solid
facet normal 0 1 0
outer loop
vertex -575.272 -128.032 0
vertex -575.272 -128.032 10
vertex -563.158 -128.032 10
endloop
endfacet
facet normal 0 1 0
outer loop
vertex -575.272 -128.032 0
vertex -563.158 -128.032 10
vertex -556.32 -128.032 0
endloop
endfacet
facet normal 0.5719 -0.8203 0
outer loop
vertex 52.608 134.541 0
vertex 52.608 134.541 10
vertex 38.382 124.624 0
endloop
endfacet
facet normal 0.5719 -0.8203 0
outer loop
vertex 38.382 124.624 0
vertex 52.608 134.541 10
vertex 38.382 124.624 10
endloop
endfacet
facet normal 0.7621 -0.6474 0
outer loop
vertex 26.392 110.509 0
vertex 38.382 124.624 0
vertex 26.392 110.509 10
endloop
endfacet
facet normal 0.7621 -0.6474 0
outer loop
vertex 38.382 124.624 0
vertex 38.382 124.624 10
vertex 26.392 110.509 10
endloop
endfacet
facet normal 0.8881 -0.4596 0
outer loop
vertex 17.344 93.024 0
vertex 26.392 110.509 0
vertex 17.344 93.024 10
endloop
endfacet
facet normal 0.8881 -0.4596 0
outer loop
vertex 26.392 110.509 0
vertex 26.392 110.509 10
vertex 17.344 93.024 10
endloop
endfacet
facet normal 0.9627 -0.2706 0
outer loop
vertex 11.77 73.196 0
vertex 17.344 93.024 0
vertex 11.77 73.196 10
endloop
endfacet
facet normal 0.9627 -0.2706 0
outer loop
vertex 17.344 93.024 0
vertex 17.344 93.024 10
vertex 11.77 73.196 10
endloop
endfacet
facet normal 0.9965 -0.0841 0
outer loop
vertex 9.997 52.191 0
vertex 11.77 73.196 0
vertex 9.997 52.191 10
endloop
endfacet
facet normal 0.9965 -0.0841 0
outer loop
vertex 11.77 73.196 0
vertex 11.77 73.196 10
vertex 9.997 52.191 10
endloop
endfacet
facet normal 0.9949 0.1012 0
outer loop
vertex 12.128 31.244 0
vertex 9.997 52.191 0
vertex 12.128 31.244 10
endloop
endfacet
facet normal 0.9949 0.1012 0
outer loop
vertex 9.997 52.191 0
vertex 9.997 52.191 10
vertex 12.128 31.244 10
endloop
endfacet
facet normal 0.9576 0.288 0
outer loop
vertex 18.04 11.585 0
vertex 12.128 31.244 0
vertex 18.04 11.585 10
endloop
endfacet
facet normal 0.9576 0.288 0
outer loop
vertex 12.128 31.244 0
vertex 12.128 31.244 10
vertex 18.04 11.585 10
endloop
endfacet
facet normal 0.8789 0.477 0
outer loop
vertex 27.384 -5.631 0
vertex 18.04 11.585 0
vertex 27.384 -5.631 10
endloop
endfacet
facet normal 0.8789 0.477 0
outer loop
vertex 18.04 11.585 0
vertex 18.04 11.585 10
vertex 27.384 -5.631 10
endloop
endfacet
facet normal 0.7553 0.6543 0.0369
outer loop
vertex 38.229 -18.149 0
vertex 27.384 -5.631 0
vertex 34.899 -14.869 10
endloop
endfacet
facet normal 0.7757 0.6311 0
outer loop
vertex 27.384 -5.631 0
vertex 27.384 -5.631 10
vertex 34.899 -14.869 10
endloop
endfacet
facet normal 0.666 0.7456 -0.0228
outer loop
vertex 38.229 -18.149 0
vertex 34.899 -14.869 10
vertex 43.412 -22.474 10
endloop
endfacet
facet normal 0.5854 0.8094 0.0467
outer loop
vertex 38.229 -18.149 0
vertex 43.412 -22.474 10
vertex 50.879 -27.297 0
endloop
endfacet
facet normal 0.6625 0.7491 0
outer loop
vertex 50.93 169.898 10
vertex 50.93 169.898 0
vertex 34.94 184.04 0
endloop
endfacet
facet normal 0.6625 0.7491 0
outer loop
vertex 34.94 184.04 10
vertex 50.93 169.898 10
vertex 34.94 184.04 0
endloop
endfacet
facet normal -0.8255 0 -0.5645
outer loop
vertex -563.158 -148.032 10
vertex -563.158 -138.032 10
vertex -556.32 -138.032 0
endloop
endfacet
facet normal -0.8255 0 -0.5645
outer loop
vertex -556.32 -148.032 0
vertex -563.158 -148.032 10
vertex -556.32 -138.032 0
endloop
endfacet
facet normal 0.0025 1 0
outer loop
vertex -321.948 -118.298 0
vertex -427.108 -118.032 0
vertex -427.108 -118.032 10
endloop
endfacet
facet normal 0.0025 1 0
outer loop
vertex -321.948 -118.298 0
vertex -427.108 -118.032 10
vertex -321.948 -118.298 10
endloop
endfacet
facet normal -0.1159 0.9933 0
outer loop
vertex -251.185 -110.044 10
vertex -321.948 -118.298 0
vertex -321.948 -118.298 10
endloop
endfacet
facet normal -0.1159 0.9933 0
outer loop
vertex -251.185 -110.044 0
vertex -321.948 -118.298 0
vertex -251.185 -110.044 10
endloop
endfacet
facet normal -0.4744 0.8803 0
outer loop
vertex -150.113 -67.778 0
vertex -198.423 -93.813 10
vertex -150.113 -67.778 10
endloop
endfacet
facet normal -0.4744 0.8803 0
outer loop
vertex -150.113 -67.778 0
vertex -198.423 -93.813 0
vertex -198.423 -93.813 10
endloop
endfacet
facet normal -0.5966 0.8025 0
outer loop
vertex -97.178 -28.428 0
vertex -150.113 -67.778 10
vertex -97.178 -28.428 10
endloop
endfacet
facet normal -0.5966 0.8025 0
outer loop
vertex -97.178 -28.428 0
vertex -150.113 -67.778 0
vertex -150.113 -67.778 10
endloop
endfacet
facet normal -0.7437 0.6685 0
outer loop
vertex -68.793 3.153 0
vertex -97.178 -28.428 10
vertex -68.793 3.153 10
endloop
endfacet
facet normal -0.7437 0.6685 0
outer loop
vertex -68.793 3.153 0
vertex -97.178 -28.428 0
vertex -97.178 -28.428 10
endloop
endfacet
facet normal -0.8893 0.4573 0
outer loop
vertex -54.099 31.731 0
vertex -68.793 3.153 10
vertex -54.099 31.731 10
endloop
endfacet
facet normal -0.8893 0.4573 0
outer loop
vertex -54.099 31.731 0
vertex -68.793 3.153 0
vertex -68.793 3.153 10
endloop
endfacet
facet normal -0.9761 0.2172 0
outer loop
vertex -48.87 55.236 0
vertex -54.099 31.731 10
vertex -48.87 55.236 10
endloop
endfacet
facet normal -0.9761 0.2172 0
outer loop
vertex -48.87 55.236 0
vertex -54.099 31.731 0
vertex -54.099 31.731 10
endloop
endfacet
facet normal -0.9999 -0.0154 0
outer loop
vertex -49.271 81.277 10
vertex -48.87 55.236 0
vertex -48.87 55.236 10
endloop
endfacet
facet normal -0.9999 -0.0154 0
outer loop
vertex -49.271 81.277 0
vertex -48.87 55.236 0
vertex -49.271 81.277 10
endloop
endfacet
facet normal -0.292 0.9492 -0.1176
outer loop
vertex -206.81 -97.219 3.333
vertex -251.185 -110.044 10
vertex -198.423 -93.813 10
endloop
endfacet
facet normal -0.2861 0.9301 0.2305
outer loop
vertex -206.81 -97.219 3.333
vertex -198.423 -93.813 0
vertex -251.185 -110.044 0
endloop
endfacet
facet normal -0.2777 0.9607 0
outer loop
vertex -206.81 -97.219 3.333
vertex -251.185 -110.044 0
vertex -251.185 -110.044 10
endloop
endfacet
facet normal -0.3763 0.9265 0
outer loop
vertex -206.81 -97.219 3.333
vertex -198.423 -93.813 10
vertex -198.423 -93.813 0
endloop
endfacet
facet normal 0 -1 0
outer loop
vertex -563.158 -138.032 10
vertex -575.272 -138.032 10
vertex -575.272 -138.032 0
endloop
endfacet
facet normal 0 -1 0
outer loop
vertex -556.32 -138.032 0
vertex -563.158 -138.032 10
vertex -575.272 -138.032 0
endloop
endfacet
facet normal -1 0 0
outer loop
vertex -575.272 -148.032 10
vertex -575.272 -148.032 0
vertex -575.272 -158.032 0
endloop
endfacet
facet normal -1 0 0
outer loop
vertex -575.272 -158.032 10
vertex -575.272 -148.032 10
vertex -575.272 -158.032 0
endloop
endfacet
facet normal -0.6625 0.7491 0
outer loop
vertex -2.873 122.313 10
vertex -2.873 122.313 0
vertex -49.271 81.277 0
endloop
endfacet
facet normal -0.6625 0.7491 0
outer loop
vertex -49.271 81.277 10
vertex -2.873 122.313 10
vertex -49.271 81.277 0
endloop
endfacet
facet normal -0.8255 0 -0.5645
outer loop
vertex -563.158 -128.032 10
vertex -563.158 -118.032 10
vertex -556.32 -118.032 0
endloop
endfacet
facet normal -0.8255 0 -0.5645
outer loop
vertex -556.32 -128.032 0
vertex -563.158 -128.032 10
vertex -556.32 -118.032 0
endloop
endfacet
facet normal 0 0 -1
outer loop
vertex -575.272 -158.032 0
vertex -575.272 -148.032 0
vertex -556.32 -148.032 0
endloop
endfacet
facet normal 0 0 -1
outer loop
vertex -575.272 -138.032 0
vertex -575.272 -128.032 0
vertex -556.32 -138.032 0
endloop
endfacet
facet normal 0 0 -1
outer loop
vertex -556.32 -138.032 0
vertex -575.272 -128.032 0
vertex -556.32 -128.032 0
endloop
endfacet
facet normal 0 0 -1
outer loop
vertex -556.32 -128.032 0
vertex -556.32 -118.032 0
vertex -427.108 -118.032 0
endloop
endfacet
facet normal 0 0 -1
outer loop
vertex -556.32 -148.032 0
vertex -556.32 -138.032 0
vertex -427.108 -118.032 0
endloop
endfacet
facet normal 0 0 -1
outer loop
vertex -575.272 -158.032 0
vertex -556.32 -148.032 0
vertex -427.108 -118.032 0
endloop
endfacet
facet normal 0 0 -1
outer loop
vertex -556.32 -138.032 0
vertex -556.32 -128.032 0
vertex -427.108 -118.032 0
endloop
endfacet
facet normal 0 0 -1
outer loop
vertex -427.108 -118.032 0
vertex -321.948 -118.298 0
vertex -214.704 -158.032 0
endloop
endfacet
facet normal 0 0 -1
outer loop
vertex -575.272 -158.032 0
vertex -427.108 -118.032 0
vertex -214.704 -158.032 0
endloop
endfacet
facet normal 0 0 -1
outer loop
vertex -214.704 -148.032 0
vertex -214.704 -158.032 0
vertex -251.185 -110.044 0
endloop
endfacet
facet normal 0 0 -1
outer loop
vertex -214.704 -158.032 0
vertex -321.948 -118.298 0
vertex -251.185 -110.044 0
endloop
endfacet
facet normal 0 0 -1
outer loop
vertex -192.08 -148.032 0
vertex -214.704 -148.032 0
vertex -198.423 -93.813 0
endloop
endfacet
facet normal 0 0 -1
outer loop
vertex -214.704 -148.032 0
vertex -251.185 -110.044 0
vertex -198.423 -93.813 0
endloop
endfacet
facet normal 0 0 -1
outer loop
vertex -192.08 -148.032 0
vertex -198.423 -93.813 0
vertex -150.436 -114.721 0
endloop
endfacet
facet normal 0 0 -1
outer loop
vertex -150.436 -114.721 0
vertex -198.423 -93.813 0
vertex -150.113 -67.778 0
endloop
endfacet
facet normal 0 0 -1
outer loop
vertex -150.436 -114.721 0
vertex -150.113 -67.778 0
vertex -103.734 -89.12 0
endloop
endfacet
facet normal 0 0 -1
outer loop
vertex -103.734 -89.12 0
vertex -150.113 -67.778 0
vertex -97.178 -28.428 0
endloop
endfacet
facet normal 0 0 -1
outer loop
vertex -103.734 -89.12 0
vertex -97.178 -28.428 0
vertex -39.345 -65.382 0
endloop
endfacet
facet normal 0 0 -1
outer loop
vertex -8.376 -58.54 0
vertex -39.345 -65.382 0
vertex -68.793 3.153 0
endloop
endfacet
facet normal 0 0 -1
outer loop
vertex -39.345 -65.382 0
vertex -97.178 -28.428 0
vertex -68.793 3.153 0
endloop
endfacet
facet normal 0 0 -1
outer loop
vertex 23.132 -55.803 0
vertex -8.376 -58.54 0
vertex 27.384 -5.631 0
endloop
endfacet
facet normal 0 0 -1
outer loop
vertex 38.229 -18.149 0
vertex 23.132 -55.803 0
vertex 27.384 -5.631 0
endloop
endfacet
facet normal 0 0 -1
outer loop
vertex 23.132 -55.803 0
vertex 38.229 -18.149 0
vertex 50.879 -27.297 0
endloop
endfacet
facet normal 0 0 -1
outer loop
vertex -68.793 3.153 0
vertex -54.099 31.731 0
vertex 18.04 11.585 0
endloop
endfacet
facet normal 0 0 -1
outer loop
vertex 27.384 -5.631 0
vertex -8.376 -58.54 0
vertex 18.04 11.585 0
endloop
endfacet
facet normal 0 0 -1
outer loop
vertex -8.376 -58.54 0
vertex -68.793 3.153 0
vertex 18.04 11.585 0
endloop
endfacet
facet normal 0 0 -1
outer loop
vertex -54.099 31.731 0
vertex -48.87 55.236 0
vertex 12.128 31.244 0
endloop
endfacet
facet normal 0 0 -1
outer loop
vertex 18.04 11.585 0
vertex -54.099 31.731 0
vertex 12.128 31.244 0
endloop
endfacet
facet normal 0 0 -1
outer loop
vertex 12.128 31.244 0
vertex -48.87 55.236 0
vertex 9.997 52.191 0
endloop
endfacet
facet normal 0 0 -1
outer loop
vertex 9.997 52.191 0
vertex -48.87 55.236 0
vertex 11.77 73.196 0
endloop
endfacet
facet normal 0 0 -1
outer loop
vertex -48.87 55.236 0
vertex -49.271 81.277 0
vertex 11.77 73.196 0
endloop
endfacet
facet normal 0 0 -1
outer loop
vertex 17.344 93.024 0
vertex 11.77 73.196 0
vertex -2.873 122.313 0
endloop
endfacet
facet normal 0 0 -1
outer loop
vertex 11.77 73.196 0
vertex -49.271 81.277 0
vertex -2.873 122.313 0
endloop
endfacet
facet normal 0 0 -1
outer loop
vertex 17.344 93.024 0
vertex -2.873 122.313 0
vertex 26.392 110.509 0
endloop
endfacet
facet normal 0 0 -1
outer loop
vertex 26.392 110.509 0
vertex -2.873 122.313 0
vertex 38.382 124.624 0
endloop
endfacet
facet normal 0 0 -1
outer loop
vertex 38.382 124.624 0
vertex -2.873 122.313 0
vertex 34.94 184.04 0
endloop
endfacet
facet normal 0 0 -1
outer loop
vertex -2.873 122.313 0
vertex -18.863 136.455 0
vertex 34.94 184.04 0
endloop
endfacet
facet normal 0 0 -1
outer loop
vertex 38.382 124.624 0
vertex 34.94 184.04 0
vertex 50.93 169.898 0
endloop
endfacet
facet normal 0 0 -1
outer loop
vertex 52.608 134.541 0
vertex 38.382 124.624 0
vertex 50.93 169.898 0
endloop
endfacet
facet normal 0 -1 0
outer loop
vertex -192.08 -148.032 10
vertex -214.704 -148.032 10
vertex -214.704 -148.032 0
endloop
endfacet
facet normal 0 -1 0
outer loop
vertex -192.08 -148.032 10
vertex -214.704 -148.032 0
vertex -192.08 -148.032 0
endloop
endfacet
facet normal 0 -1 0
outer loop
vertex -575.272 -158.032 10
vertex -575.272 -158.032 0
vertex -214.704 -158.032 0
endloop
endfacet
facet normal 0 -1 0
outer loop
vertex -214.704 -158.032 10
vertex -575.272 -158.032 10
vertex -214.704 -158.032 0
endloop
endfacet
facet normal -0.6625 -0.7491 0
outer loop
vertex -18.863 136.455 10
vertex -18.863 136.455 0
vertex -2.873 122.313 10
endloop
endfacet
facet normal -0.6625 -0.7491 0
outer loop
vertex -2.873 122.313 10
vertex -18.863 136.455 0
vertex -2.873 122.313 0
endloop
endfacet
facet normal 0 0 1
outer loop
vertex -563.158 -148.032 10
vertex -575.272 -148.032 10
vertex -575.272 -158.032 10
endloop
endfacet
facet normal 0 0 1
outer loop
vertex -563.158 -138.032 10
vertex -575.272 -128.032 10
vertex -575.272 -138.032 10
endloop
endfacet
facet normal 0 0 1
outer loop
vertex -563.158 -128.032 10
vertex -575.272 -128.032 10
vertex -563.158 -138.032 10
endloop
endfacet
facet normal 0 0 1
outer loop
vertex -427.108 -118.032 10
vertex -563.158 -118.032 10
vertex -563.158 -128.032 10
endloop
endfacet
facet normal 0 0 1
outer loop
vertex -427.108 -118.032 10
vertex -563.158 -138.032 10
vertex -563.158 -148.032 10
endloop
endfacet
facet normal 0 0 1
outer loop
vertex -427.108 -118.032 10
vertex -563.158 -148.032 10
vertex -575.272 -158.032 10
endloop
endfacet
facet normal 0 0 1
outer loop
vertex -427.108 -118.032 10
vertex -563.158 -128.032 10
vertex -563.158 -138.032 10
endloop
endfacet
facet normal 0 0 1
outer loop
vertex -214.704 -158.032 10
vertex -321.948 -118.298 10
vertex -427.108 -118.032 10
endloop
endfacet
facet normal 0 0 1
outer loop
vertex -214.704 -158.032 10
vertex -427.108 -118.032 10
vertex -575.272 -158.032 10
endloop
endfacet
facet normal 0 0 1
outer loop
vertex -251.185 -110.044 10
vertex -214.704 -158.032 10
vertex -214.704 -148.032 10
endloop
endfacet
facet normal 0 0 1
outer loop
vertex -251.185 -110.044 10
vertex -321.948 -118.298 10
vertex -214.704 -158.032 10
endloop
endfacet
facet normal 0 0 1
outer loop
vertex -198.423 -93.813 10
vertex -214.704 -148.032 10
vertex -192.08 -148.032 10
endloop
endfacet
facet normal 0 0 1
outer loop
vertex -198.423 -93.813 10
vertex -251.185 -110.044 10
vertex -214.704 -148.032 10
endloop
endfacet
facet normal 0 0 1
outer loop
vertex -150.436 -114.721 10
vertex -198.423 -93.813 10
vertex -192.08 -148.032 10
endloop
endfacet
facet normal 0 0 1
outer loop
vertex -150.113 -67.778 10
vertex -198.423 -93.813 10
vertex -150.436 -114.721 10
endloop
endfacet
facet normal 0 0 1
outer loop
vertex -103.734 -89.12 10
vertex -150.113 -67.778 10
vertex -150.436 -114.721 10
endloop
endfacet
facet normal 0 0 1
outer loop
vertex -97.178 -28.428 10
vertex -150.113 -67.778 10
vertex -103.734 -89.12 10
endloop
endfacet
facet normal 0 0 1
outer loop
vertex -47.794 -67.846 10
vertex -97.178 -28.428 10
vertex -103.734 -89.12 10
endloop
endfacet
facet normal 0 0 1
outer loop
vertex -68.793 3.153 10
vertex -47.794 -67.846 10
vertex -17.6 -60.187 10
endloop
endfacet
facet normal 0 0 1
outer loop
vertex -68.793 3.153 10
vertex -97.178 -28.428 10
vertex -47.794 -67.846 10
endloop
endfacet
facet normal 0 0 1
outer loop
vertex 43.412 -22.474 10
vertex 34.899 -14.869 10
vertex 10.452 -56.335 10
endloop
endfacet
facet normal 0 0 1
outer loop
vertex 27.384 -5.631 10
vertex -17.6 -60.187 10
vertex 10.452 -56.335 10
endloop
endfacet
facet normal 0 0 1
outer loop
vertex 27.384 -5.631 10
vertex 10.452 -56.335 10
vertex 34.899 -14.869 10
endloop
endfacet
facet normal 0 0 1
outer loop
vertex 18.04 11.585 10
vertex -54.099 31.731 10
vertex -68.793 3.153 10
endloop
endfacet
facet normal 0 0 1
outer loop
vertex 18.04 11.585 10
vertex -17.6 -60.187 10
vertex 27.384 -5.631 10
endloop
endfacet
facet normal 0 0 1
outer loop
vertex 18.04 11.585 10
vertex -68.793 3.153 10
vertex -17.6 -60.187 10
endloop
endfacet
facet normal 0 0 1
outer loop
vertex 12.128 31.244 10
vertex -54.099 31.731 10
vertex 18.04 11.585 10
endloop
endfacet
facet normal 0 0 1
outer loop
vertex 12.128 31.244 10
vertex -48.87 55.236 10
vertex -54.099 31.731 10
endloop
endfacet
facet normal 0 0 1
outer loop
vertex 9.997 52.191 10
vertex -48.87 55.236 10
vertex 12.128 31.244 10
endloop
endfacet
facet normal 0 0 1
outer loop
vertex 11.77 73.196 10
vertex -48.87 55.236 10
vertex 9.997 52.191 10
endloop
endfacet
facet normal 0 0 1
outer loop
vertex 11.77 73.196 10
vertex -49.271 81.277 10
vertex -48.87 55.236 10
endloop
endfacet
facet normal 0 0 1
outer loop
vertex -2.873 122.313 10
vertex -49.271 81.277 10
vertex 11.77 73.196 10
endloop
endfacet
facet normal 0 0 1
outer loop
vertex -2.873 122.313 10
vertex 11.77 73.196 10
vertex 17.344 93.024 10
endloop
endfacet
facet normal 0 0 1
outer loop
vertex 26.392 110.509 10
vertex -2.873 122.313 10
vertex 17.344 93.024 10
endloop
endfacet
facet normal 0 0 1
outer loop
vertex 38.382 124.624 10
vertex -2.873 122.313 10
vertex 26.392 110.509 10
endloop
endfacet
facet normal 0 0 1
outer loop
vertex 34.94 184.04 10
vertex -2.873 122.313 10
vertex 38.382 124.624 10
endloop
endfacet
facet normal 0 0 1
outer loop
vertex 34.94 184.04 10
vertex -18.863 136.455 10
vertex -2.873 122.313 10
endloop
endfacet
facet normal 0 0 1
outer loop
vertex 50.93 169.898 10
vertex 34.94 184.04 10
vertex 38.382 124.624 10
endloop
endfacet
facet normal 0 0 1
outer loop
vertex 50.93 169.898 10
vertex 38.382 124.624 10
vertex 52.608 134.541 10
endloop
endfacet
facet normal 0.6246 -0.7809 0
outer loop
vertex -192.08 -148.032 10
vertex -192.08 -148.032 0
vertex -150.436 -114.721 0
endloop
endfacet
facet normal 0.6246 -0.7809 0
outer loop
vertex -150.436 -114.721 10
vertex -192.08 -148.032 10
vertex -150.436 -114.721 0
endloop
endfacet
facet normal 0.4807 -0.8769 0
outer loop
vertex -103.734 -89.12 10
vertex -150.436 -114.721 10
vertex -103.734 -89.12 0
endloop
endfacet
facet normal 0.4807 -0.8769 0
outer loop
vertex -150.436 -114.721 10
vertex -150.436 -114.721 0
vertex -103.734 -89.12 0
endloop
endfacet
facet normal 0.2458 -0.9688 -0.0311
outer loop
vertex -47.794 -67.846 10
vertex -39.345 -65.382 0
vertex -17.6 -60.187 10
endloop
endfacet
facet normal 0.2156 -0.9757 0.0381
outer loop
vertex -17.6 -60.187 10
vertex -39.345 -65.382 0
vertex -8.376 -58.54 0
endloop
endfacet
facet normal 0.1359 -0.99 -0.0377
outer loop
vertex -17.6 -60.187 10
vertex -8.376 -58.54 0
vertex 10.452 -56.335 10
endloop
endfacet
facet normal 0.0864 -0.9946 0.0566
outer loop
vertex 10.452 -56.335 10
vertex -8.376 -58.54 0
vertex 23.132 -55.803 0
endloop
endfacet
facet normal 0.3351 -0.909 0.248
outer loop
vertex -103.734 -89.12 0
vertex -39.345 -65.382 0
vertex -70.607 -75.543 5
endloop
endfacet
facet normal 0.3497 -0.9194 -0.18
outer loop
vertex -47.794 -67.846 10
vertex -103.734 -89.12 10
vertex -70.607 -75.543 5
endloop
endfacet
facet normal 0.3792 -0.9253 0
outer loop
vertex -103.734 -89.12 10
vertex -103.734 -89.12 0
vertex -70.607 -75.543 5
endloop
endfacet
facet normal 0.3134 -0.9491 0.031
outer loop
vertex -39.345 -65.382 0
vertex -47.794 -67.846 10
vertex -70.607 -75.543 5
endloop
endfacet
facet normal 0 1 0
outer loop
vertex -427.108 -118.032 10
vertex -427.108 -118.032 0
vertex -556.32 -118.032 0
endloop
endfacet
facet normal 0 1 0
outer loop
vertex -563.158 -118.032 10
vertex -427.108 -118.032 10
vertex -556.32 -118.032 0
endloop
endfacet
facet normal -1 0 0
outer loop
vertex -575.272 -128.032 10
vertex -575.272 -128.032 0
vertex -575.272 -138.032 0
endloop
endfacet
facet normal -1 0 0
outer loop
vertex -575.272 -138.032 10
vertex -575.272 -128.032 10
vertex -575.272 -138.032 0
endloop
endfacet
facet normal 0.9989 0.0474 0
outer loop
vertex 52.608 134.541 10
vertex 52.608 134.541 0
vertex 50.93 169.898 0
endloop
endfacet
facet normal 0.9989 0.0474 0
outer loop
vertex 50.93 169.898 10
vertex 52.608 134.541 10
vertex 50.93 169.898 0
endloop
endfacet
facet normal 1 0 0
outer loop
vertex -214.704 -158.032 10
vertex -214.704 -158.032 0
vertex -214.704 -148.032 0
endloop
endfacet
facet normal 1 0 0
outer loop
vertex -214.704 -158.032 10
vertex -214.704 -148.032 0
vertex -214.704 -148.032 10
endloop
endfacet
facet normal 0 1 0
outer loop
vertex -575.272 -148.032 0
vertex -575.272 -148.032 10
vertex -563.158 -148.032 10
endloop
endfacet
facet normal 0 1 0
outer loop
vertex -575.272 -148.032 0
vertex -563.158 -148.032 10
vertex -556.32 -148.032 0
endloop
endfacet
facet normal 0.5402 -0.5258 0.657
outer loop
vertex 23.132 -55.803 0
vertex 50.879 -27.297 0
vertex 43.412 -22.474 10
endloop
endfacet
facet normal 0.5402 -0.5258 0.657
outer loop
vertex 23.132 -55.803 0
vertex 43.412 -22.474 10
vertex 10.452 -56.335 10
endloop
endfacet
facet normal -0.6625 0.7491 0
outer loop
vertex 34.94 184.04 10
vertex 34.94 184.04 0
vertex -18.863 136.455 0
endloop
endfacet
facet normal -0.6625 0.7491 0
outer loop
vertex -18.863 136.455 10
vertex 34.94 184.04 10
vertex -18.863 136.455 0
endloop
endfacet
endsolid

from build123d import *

# Parameters (mm, degrees)
BOSS_EXTRUDE1_DEPTH = 10
CUT_EXTRUDE1_DEPTH  = 10
SKETCH4_RX          = 87.174762469
SKETCH4_RY          = 66.453525419
CUT_EXTRUDE2_DEPTH  = 10
SKETCH5_W           = 26.438615702
SKETCH5_H           = 10
CUT_EXTRUDE5_DEPTH  = 30
SKETCH6_W           = 22.623740515
SKETCH6_H           = 10
CUT_EXTRUDE6_DEPTH  = 10


with BuildPart() as part:
    # Sketch1 → Boss-Extrude1 (new body)
    with BuildSketch(Plane.XY):
        with BuildLine():
            Line((-427.107921319, -118.031926349), (-575.271952131, -118.031926349))
            Line((-575.271952131, -118.031926349), (-575.271952131, -158.031926349))
            Line((-575.271952131, -158.031926349), (-192.080048862, -158.031926349))
            Line((-192.080048862, -158.031926349), (-192.080048862, -148.031926349))
            add(Edge.make_bspline(
                [(-192.080048862, -148.031926349), (-157.837008984, -114.51884489), (-75.168475425, -70.609825384), (16.241097891, -49.938935327), (61.818541816, -59.568417069)],
                knots=[0, 0, 0, 0, 0.513639289, 1, 1, 1, 1], degree=3))
            Line((61.818541816, -59.568417069), (50.930294818, 169.898138867))
            Line((50.930294818, 169.898138867), (34.940241092, 184.040274491))
            Line((34.940241092, 184.040274491), (-18.862584596, 136.455265033))
            Line((-18.862584596, 136.455265033), (-2.872530869, 122.313129409))
            Line((-2.872530869, 122.313129409), (-49.270535503, 81.277190105))
            add(Edge.make_bspline(
                [(-427.107921319, -118.031926349), (-356.64028899, -119.331018895), (-244.870528992, -125.219604065), (-108.651854921, -44.255191333), (-41.057154586, 17.202634848), (-49.270535503, 81.277190105)],
                knots=[0, 0, 0, 0, 0.468078311, 0.64359283, 1, 1, 1, 1], degree=3))
        make_face()
    extrude(amount=BOSS_EXTRUDE1_DEPTH)

    # Sketch2 → Cut-Extrude1 (cut, symmetric)
    with BuildSketch(Plane(origin=(28.004521107, -27.258908823, 34.059132337), x_dir=(0.8415259589150524, 0.33755828909978275, -0.4217682561930533), z_dir=(0.5402166791872512, -0.5258335661753164, 0.6570121766080502))):
        Polygon((55.096893941, -25.281928608), (25.403338602, -49.506612522), (-27.145369489, -41.573178566), (2.888217841, -17.531746483), (44.92299541, 24.503031085), (95.182381766, 9.000336469), align=None)
    extrude(amount=CUT_EXTRUDE1_DEPTH, both=True, mode=Mode.SUBTRACT)


with BuildPart() as cut_extrude1_kept_piece:
    # of the separate pieces the step leaves, the one the design keeps (cut_extrude1_pieces_kept)
    add(part.part.solids().sort_by_distance((-427.107921319, -118.031926349, 0))[0])

    # Sketch4 → Cut-Extrude2 (cut)
    with BuildSketch(Plane.XY.offset(10)):
        with Locations(Location((76.445934185, 53.167488188), (0, 0, -90))):
            Ellipse(SKETCH4_RX, SKETCH4_RY)
    extrude(amount=-CUT_EXTRUDE2_DEPTH, mode=Mode.SUBTRACT)

    # Sketch5 → Cut-Extrude5 (cut)
    with BuildSketch(Plane(origin=(-379.077692484, 0, -259.207509724), x_dir=(0.5644444444444446, 0, -0.8254710589328995), z_dir=(0.8254710589328994, 0, 0.5644444444444445))):
        with Locations((-327.230934206, -123.031926349)):
            Rectangle(SKETCH5_W, SKETCH5_H)
        with Locations((-327.230934206, -143.031926349)):
            Rectangle(SKETCH5_W, SKETCH5_H)
    extrude(amount=-CUT_EXTRUDE5_DEPTH, mode=Mode.SUBTRACT)

    # Sketch6 → Cut-Extrude6 (cut)
    with BuildSketch(Plane.XZ.offset(158.031926349)):
        with Locations((-203.39191912, 5)):
            Rectangle(SKETCH6_W, SKETCH6_H)
    extrude(amount=-CUT_EXTRUDE6_DEPTH, mode=Mode.SUBTRACT)


solid = cut_extrude1_kept_piece.part
